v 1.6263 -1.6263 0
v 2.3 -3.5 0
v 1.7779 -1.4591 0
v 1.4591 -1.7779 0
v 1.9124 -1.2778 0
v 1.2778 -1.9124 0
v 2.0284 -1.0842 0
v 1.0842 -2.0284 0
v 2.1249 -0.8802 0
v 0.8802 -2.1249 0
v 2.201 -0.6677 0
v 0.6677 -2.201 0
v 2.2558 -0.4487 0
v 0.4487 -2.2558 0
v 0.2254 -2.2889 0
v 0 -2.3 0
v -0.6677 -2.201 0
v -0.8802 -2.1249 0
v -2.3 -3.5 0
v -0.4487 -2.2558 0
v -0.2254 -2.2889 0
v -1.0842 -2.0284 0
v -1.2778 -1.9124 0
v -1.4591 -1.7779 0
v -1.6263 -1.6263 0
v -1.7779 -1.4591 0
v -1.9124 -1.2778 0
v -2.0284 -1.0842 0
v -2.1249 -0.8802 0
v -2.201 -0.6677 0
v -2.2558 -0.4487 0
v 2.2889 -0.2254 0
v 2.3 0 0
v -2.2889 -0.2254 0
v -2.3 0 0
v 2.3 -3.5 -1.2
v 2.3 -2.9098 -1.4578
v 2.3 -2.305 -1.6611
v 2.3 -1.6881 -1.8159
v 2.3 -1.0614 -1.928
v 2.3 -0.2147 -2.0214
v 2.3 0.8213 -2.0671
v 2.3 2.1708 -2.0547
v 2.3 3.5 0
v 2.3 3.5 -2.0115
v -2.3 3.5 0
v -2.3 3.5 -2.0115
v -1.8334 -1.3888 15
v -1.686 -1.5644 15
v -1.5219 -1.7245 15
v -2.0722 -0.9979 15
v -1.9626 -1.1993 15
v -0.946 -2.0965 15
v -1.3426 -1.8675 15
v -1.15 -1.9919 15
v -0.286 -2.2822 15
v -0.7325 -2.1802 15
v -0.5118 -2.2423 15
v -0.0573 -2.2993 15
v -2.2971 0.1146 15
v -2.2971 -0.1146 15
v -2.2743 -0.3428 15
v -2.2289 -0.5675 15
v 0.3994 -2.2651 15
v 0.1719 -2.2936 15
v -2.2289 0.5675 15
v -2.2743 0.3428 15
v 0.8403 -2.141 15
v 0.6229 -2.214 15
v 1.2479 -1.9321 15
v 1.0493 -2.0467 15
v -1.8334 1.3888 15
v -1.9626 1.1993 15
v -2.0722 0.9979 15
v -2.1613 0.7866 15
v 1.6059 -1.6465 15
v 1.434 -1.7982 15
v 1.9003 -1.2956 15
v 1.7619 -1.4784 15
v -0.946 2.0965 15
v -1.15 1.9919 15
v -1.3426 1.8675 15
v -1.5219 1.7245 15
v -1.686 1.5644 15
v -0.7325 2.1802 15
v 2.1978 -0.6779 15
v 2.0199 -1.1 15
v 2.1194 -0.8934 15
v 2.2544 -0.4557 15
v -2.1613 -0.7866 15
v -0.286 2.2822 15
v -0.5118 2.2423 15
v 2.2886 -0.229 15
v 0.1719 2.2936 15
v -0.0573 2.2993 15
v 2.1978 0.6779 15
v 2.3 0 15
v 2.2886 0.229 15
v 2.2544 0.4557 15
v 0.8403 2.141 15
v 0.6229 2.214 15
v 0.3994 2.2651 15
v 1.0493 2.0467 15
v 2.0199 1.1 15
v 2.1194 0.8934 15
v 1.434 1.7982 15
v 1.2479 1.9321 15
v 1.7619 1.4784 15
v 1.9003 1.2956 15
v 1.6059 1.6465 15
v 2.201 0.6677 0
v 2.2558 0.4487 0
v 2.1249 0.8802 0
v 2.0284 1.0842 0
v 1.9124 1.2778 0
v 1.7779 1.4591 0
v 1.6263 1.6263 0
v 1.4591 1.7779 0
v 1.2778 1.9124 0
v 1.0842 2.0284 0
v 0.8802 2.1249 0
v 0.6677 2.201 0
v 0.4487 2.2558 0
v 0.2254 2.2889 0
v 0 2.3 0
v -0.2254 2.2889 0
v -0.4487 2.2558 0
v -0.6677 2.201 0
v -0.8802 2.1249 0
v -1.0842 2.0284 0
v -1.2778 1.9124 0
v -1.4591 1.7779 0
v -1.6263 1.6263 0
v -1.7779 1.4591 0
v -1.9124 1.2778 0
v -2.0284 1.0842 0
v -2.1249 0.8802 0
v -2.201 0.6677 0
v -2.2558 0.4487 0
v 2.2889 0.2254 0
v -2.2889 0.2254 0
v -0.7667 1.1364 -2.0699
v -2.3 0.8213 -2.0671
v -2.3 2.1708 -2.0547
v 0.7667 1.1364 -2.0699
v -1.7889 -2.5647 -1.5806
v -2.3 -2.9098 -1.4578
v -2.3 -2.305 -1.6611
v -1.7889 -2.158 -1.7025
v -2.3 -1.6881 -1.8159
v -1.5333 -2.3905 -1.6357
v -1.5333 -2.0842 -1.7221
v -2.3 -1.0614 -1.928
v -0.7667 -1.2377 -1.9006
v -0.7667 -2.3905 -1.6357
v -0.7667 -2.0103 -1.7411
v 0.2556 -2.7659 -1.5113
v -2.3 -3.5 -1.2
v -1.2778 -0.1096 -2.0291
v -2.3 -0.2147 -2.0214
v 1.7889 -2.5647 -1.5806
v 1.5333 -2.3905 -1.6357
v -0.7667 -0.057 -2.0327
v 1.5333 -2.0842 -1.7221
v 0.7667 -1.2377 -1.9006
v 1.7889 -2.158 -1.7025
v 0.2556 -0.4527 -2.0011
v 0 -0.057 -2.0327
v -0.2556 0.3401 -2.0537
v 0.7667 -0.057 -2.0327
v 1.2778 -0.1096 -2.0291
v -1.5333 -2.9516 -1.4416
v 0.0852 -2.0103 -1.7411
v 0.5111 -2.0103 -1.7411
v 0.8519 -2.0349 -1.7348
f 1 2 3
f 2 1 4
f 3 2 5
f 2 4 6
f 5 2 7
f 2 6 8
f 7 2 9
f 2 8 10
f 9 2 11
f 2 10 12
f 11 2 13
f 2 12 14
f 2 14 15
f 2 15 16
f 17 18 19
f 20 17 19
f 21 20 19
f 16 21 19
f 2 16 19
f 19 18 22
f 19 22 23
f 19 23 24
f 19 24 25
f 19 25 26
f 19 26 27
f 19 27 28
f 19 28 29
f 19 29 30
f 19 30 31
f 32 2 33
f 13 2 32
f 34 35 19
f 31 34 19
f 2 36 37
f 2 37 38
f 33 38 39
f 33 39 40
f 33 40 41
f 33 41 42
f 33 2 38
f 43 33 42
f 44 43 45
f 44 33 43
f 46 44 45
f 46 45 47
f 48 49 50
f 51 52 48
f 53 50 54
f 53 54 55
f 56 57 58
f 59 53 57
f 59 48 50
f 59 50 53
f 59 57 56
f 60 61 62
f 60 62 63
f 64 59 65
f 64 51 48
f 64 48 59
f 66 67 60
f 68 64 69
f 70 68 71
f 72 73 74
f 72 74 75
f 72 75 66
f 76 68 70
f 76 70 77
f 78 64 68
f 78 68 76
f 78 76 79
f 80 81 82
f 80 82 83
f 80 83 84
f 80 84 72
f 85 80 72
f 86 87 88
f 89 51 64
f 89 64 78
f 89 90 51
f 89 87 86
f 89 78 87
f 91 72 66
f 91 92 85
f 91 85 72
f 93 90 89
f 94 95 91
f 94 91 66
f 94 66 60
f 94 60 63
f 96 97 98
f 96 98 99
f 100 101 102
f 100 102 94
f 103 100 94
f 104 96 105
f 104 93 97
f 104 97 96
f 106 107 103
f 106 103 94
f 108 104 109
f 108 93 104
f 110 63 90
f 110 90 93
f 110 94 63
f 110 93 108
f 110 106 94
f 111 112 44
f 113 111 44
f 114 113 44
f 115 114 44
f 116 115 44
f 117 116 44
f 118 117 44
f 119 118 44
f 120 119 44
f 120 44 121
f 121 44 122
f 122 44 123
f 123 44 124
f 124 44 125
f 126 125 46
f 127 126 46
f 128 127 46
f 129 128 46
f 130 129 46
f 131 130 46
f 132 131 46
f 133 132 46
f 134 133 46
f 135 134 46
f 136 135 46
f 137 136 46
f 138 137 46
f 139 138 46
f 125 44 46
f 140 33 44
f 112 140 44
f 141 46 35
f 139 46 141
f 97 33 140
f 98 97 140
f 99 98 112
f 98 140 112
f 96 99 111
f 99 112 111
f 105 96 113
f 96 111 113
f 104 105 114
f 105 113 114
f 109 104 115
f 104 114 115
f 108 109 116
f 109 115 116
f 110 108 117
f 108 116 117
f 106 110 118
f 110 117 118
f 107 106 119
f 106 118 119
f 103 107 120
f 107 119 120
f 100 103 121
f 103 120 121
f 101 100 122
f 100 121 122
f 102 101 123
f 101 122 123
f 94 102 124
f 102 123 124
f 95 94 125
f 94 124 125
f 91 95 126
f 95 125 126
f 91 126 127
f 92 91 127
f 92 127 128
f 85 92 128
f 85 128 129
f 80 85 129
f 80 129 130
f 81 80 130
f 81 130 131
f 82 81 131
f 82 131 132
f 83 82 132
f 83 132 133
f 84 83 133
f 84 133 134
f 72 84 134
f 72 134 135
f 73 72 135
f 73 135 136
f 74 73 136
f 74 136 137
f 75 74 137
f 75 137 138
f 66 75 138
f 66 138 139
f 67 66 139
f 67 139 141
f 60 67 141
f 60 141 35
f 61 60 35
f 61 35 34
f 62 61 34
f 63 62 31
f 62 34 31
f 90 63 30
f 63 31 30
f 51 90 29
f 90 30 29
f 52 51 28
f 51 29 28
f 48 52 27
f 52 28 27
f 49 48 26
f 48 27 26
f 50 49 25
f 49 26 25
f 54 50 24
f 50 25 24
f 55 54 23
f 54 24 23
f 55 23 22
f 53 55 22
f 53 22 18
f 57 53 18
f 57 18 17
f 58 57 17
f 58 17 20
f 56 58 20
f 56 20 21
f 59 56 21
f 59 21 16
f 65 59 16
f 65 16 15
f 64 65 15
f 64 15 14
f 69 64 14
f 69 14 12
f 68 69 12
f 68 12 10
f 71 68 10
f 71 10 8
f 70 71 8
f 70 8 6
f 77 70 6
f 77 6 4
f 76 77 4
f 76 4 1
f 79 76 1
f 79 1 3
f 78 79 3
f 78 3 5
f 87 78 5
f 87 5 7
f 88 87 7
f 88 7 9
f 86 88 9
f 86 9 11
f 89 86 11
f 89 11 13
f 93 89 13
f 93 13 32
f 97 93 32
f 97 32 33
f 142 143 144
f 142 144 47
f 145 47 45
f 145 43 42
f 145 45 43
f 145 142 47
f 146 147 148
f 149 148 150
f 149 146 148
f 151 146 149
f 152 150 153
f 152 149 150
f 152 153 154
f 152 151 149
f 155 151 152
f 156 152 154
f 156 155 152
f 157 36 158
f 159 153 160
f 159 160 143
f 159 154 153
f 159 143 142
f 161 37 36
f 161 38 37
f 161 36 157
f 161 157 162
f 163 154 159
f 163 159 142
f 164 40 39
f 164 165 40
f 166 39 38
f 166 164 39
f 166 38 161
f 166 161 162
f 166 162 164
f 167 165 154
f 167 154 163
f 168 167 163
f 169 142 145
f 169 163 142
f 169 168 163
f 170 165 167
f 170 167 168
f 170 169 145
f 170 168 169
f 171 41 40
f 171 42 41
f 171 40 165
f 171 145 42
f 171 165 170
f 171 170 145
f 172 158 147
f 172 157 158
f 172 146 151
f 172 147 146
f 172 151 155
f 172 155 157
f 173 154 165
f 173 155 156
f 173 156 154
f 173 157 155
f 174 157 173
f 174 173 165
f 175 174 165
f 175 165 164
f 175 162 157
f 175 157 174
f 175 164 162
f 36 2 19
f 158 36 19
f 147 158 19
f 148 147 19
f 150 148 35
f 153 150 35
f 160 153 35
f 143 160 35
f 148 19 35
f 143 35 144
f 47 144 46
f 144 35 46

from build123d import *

# Parameters (mm, degrees)
SKETCH1_R           = 2.3
BOSS_EXTRUDE1_DEPTH = 15
SKETCH2_W           = 4.6
SKETCH2_H           = 7
BOSS_EXTRUDE2_DEPTH = 3
CUT_EXTRUDE1_DEPTH  = 4.6


with BuildPart() as part:
    # Sketch1 → Boss-Extrude1 (new body)
    with BuildSketch(Plane.XY):
        Circle(SKETCH1_R)
    extrude(amount=BOSS_EXTRUDE1_DEPTH)

    # Sketch2 → Boss-Extrude2 (add)
    with BuildSketch(Plane(origin=(0, 0, 0), x_dir=(-1, 0, 0), z_dir=(0, 0, -1))):
        Rectangle(SKETCH2_W, SKETCH2_H)
    extrude(amount=BOSS_EXTRUDE2_DEPTH)

    # Sketch3 → Cut-Extrude1 (cut)
    with BuildSketch(Plane(origin=(2.3, 0, 0), x_dir=(0, 0, -1), z_dir=(1, 0, 0))):
        with BuildLine():
            Line((1.2, -3.5), (3, -3.5))
            Line((3, -3.5), (3, 3.5))
            Line((3, 3.5), (2.011534301, 3.5))
            add(Edge.make_bspline(
                [(1.2, -3.5), (2.267514736, -1.334400874), (2.08240034, 1.182388913), (2.011534301, 3.5)],
                knots=[0, 0, 0, 0, 1, 1, 1, 1], degree=3))
        make_face()
    extrude(amount=-CUT_EXTRUDE1_DEPTH, mode=Mode.SUBTRACT)


solid = part.part
